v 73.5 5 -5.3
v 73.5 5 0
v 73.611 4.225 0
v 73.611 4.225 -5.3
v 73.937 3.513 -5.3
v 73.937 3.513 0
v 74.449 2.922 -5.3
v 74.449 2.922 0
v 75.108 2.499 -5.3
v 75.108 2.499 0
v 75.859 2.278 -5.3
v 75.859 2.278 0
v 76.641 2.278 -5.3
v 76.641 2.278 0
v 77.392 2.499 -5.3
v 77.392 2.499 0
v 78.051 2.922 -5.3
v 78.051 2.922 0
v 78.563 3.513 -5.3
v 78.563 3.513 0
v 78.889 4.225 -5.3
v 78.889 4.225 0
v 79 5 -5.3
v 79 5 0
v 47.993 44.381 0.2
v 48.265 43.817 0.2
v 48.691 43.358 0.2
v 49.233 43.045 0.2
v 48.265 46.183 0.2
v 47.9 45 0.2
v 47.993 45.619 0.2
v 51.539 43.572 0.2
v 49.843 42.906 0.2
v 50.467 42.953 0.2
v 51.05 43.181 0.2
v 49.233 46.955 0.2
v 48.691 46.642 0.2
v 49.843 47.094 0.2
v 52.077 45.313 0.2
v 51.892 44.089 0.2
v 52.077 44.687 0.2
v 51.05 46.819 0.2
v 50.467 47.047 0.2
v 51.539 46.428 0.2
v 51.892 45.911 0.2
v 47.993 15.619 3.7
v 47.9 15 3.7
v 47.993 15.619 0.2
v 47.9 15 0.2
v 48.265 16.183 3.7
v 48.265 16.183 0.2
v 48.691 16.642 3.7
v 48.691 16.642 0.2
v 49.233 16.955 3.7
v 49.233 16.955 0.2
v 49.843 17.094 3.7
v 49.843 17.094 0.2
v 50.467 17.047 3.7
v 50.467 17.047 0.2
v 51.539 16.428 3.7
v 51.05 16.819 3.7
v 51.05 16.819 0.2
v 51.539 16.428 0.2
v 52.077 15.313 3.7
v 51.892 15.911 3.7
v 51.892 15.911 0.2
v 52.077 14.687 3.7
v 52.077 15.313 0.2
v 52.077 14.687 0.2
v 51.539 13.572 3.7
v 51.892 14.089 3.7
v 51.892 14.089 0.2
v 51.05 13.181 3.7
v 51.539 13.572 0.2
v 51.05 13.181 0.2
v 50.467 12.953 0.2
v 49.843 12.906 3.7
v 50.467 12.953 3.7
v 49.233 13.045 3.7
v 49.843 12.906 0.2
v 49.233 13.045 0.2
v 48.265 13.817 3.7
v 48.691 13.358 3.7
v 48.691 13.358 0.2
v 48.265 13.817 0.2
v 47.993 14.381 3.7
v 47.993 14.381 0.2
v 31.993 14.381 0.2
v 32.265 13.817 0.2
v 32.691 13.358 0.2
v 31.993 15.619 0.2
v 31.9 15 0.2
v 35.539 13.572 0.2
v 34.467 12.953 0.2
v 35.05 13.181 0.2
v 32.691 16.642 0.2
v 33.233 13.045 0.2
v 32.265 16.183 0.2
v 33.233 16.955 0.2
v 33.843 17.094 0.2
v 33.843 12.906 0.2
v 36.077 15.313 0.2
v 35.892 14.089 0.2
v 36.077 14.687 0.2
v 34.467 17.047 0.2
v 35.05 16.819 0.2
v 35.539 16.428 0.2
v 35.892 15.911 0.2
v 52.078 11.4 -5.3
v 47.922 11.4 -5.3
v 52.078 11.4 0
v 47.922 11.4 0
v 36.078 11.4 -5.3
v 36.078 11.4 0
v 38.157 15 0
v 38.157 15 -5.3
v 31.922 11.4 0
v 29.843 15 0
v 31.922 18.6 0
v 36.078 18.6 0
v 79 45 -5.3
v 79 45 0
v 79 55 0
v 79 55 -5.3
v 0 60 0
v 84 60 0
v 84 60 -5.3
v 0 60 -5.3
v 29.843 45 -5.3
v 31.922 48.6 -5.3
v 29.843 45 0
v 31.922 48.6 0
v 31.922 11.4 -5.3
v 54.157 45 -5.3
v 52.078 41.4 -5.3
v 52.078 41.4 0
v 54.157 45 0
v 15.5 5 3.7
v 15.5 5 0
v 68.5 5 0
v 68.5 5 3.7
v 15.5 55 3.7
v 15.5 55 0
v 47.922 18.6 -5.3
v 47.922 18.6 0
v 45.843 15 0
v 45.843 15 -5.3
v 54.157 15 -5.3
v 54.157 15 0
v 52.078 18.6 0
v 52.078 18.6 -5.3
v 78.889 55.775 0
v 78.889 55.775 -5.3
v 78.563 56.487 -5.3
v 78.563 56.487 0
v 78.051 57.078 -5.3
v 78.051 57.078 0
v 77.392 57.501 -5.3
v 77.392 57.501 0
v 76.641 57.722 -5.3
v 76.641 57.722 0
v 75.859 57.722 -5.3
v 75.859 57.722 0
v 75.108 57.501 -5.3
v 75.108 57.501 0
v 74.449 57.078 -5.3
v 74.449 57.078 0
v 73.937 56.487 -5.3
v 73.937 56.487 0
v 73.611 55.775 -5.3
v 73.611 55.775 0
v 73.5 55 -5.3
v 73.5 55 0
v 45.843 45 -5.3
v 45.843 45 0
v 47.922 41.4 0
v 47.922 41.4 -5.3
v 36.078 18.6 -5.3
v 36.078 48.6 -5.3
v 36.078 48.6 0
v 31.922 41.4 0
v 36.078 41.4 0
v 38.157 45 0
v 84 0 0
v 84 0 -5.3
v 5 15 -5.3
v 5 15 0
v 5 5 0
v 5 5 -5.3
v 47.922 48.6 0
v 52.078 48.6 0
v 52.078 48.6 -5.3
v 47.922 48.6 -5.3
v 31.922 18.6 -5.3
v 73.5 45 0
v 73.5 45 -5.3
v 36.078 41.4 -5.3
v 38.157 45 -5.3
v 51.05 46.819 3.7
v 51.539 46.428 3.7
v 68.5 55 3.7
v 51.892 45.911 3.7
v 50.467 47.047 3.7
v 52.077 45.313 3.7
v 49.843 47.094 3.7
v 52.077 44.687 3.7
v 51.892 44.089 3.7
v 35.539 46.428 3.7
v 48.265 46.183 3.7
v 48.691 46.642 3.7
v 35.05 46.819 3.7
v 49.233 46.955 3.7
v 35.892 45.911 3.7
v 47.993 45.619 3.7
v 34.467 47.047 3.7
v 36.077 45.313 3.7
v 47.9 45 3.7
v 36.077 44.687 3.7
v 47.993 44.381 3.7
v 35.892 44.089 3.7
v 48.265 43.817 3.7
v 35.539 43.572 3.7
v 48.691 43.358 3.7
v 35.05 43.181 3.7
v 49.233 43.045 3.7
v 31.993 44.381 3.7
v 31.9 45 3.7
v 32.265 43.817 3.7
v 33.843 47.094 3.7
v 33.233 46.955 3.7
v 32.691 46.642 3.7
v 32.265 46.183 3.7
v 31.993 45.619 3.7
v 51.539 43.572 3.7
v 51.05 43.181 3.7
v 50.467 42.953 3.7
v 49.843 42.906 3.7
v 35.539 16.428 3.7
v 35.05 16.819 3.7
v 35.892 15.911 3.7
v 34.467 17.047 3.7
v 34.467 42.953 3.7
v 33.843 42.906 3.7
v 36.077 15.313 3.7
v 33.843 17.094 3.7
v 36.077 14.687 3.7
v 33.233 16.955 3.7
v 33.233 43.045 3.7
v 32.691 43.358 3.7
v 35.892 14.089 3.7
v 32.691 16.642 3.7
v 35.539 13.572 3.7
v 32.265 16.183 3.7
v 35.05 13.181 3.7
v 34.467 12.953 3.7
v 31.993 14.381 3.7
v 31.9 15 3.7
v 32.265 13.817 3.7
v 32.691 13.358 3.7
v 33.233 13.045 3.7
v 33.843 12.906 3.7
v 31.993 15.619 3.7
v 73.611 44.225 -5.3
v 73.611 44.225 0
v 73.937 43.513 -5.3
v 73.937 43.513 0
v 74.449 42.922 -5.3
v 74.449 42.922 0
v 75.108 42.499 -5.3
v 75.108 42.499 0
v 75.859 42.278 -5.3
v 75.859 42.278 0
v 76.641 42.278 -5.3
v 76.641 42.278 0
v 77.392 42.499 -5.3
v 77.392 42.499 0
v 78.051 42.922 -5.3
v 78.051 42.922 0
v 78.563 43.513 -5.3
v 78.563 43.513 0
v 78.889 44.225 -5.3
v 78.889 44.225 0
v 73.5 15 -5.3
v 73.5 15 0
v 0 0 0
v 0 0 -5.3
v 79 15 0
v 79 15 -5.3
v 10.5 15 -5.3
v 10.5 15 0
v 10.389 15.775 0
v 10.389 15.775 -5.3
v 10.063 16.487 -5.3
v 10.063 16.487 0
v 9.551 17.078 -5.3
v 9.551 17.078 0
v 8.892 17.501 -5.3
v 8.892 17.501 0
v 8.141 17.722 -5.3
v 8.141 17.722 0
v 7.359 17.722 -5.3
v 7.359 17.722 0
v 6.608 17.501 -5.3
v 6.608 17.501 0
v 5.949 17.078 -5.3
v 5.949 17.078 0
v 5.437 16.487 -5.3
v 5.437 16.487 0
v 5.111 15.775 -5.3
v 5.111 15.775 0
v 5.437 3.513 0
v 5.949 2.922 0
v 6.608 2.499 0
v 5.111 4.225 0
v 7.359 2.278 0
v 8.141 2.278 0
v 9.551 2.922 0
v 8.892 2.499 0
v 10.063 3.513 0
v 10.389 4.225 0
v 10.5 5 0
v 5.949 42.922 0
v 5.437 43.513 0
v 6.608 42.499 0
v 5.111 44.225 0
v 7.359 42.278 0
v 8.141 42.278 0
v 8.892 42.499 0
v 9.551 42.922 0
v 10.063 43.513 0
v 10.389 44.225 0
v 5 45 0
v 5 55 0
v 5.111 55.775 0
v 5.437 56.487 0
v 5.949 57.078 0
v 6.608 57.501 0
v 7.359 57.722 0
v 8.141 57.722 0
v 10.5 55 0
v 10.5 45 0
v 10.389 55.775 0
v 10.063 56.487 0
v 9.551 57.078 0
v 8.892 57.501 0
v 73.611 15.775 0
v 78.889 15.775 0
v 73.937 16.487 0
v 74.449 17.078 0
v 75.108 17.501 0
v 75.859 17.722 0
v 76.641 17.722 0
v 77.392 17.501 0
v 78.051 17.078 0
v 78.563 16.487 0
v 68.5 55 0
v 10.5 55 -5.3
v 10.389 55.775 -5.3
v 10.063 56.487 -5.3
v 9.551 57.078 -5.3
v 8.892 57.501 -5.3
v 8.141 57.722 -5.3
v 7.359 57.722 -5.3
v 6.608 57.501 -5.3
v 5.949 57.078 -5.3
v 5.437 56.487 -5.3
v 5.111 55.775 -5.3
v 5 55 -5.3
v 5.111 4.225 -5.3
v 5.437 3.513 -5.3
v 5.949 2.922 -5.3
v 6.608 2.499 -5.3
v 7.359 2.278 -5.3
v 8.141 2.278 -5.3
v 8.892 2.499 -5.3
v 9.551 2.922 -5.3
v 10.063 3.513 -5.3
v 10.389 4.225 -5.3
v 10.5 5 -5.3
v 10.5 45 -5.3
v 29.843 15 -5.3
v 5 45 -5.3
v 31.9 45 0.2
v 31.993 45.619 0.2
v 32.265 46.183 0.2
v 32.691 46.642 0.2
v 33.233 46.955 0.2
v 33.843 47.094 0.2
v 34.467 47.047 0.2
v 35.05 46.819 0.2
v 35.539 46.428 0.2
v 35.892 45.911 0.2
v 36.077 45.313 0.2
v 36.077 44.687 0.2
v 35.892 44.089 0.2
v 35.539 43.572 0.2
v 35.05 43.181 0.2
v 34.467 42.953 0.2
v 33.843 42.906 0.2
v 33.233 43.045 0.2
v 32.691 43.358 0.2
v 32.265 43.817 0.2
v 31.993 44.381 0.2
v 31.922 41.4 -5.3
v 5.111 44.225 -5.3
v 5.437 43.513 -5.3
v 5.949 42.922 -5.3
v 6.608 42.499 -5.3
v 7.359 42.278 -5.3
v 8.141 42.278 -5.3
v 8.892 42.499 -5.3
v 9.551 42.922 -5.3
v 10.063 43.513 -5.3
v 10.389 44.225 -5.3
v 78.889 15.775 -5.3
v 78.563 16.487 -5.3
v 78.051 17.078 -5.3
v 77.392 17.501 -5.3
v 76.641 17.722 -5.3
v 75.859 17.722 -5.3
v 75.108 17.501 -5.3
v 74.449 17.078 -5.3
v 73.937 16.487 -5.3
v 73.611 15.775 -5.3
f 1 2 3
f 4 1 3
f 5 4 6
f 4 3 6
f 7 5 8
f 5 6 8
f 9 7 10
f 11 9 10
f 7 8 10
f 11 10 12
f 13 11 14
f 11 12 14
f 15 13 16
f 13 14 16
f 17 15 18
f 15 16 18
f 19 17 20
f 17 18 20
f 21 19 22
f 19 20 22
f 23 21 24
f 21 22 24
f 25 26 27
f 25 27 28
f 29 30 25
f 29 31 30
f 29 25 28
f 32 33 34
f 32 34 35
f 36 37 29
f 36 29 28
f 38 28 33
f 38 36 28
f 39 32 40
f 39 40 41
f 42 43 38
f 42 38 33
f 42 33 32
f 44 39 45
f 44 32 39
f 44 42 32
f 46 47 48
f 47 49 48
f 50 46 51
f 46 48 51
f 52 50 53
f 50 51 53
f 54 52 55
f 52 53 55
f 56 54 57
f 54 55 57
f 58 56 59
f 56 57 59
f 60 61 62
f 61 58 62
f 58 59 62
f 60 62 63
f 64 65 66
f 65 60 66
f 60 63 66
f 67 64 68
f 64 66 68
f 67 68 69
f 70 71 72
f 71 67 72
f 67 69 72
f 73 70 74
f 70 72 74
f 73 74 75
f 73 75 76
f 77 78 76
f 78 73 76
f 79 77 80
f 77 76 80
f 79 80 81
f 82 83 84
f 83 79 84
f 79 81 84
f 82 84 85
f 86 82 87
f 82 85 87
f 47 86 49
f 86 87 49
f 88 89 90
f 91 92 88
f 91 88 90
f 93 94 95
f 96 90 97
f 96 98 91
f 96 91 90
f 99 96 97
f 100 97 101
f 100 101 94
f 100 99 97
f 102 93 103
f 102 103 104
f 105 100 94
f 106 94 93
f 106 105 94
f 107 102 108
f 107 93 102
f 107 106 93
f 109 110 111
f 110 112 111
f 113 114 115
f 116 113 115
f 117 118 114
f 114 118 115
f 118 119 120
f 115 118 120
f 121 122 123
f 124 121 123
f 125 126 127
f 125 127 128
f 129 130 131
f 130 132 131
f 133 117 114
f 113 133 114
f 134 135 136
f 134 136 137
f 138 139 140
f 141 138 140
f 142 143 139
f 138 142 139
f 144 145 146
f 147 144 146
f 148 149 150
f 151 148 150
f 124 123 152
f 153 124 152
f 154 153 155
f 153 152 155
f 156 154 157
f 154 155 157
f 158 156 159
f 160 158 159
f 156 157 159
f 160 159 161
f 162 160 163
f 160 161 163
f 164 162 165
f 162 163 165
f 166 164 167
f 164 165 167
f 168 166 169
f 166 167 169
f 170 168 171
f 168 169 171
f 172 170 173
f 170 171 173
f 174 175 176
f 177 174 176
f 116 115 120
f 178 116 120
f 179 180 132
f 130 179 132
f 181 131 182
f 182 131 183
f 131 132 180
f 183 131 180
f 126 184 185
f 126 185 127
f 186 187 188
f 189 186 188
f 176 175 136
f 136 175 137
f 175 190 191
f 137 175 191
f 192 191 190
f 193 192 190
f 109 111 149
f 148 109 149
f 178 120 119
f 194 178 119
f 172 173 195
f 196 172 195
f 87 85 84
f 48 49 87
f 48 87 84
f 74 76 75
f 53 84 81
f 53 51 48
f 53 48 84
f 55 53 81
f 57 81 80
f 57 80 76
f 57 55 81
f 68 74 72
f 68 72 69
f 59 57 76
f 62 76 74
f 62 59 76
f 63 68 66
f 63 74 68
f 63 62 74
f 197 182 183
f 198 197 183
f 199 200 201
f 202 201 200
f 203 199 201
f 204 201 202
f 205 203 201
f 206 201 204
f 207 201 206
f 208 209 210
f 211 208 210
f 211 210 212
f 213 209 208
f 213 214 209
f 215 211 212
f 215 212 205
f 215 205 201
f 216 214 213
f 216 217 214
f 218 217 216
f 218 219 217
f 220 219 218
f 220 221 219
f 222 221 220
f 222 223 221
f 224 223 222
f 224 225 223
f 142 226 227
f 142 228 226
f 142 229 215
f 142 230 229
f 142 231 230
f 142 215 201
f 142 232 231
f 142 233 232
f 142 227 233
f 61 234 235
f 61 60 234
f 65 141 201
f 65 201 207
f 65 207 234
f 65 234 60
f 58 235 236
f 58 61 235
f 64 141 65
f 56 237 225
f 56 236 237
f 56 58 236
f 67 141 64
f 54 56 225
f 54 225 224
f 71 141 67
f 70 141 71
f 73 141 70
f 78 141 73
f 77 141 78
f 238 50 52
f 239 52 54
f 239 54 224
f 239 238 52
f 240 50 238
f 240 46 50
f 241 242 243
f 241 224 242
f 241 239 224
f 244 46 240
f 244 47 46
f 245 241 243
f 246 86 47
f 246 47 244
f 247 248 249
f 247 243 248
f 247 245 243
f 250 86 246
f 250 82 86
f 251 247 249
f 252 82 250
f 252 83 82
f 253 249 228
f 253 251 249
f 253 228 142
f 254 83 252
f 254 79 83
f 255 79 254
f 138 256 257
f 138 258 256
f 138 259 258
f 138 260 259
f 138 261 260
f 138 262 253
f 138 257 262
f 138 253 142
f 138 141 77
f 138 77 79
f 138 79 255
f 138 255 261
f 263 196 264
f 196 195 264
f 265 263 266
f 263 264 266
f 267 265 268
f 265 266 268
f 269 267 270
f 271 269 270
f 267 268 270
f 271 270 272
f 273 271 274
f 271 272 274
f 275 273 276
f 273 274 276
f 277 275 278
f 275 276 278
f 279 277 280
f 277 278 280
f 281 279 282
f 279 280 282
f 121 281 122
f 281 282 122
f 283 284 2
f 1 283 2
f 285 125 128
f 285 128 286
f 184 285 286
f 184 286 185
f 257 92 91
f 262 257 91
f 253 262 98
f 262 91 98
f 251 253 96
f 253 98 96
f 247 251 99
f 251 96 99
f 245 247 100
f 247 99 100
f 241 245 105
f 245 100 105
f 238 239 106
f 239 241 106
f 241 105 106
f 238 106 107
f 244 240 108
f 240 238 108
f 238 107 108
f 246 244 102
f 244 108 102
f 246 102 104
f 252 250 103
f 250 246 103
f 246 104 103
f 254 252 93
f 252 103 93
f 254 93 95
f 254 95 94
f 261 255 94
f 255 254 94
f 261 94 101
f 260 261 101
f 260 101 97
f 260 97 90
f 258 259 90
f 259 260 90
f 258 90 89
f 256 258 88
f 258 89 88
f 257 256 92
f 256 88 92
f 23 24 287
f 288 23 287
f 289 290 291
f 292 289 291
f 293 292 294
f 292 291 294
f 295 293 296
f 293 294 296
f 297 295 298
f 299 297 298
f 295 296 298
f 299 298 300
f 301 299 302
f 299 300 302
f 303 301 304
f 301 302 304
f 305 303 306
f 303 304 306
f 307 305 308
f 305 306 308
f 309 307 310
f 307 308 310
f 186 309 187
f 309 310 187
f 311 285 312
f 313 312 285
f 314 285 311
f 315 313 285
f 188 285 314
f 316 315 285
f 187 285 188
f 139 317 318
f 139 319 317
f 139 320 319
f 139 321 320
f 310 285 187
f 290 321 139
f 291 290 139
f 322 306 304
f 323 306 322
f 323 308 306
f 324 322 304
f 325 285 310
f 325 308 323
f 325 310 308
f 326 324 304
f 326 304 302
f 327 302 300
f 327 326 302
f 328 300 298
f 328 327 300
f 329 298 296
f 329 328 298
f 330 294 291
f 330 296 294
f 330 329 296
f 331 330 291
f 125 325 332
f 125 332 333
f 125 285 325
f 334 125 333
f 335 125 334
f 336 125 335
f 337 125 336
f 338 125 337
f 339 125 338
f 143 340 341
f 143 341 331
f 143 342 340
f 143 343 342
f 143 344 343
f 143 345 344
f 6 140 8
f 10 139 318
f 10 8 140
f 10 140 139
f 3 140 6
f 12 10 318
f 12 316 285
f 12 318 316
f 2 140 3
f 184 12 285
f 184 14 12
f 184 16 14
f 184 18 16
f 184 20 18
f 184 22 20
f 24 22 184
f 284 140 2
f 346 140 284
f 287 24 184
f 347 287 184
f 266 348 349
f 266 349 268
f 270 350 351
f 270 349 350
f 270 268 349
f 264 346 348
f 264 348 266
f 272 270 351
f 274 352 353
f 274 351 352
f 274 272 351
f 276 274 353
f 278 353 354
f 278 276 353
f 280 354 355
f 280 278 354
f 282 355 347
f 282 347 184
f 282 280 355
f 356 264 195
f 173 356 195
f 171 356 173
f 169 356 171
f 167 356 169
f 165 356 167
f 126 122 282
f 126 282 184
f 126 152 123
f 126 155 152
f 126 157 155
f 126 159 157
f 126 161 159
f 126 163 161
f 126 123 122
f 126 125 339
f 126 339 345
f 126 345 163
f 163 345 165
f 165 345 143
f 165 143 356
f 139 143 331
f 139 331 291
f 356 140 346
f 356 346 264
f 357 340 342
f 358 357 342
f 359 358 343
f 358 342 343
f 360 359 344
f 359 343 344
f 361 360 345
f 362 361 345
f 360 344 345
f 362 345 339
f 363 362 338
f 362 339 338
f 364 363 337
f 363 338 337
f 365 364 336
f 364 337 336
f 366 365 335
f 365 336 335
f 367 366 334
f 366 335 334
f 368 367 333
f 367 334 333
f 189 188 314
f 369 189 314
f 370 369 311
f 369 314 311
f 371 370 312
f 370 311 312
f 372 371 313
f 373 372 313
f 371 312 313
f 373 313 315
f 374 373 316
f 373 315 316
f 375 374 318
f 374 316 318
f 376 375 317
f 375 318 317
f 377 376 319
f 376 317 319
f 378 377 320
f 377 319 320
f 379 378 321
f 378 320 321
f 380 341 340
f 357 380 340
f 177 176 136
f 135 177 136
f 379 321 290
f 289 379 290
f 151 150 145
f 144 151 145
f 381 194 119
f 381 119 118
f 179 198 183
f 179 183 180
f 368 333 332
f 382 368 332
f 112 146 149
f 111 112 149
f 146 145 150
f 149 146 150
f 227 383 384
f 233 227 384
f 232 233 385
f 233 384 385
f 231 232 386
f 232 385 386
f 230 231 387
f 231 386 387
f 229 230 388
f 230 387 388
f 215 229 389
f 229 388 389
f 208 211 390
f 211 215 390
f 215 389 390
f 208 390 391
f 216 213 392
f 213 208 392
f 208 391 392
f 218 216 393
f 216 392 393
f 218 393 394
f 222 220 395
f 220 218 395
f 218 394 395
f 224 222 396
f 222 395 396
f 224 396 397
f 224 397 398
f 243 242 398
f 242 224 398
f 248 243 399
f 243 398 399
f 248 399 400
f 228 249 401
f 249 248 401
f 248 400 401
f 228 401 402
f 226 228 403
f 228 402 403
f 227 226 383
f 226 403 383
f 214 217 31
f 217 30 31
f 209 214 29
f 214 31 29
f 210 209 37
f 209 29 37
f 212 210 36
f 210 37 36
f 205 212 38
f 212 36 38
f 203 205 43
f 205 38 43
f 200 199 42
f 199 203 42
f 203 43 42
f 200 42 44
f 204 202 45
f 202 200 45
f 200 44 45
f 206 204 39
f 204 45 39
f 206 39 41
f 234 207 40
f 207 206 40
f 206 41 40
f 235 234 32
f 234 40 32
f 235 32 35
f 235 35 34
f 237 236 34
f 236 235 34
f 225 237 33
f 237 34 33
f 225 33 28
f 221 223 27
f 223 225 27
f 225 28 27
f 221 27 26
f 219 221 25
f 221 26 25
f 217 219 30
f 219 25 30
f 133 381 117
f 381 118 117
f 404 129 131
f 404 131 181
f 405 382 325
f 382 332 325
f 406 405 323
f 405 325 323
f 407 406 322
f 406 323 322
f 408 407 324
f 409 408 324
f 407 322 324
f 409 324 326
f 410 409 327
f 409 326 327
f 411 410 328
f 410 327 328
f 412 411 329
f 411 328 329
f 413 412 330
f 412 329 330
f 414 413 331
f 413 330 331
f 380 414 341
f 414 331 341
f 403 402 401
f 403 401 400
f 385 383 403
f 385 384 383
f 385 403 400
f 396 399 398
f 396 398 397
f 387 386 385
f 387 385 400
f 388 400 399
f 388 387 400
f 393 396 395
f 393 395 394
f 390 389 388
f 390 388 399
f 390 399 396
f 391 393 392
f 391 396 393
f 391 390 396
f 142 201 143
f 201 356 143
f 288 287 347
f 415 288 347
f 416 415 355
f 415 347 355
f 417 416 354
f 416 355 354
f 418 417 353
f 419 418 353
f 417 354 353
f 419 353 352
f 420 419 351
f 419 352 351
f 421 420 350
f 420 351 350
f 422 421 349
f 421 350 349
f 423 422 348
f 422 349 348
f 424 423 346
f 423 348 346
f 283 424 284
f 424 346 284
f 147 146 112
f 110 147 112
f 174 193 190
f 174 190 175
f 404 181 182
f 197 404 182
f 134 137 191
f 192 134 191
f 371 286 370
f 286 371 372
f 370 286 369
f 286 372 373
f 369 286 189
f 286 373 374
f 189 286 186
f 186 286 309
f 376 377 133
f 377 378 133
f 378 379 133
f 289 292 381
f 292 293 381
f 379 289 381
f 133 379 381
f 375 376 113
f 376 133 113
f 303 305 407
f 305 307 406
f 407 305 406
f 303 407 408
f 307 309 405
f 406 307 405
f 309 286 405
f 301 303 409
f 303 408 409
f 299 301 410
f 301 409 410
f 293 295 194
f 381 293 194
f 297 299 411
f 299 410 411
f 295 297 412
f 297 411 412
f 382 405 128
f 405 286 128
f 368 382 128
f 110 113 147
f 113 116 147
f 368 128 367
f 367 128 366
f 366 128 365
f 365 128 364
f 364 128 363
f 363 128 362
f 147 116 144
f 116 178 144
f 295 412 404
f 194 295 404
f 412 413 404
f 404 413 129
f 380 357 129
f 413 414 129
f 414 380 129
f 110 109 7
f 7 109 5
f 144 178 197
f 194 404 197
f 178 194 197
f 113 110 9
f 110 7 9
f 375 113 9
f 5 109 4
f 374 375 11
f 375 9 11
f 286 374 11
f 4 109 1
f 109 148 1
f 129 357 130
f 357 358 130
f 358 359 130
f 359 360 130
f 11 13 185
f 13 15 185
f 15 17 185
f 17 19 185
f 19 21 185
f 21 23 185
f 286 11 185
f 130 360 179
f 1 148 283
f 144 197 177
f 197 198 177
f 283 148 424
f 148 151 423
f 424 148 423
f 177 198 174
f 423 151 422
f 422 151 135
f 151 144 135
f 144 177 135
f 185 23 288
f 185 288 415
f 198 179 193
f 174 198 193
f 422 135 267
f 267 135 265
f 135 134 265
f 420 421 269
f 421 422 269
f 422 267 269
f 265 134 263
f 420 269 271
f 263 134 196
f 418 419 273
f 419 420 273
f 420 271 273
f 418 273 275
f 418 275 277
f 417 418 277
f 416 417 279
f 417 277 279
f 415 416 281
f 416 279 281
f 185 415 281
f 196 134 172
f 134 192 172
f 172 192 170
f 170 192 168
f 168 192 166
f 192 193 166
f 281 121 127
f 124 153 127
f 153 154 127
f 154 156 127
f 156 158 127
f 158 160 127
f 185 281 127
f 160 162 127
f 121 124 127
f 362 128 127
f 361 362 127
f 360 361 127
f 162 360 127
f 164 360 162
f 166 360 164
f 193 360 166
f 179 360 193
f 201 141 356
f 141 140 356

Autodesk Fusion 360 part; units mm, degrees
sketch "Sketch1" plane through (0, 0, 0) normal (0, 0, 1) x (1, 0, 0)
  line L0 (0, 0) -> (84, 0)
  line L1 (84, 0) -> (84, 60)
  line L2 (84, 60) -> (0, 60)
  line L3 (0, 60) -> (0, 0)
  line L4 (5, 60) -> (5, 0) construction
  line L5 (79, 60) -> (79, 0) construction
  line L6 (5, 50) -> (79, 50) construction
  line L7 (5, 10) -> (79, 10) construction
  line L8 (7.75, 50) -> (7.75, 10) construction
  line L9 (76.25, 50) -> (76.25, 10) construction
  line L10 (5, 55) -> (79, 55) construction
  line L11 (5, 5) -> (79, 5) construction
  line L12 (7.75, 10) -> (7.75, 5) construction
  line L13 (7.75, 50) -> (7.75, 55) construction
  line L14 (76.25, 50) -> (76.25, 55) construction
  line L15 (76.25, 10) -> (76.25, 5) construction
  line L16 (7.75, 15) -> (76.25, 15) construction
  line L17 (7.75, 45) -> (76.25, 45) construction
  line L18 (5, 55) -> (5, 45)
  arc A0 (5, 45) -> (10.5, 45) centre (7.75, 45) ccw
  line L19 (10.5, 45) -> (10.5, 55)
  arc A1 (10.5, 55) -> (5, 55) centre (7.75, 55) ccw
  line L20 (7.75, 55) -> (7.75, 45) construction
  line L21 (10.5, 5) -> (10.5, 15)
  arc A2 (10.5, 15) -> (5, 15) centre (7.75, 15) ccw
  line L22 (5, 15) -> (5, 5)
  arc A3 (5, 5) -> (10.5, 5) centre (7.75, 5) ccw
  line L23 (7.75, 5) -> (7.75, 15) construction
  line L24 (73.5, 55) -> (73.5, 45)
  arc A4 (73.5, 45) -> (79, 45) centre (76.25, 45) ccw
  line L25 (79, 45) -> (79, 55)
  arc A5 (79, 55) -> (73.5, 55) centre (76.25, 55) ccw
  line L26 (76.25, 55) -> (76.25, 45) construction
  line L27 (73.5, 15) -> (73.5, 5)
  arc A6 (73.5, 5) -> (79, 5) centre (76.25, 5) ccw
  line L28 (79, 5) -> (79, 15)
  arc A7 (79, 15) -> (73.5, 15) centre (76.25, 15) ccw
  line L29 (76.25, 15) -> (76.25, 5) construction
  line L30 (15.5, 55) -> (68.5, 55)
  line L31 (68.5, 55) -> (68.5, 5)
  line L32 (68.5, 5) -> (15.5, 5)
  line L33 (15.5, 5) -> (15.5, 55)
  line L34 (15.5, 55) -> (68.5, 5) construction
  line L35 (68.5, 55) -> (15.5, 5) construction
  line L36 (68.5, 55) -> (68.5, 5) construction
  line L37 (15.5, 55) -> (15.5, 5) construction
  line L38 (50, 15) -> (50, 45) construction
  line L39 (34, 15) -> (34, 45) construction
  line L40 (31.9215, 18.6) -> (29.8431, 15)
  line L41 (29.8431, 15) -> (31.9215, 11.4)
  line L42 (31.9215, 11.4) -> (36.0785, 11.4)
  line L43 (36.0785, 11.4) -> (38.1569, 15)
  line L44 (38.1569, 15) -> (36.0785, 18.6)
  line L45 (36.0785, 18.6) -> (31.9215, 18.6)
  line L46 (36.0785, 41.4) -> (38.1569, 45)
  line L47 (38.1569, 45) -> (36.0785, 48.6)
  line L48 (36.0785, 48.6) -> (31.9215, 48.6)
  line L49 (31.9215, 48.6) -> (29.8431, 45)
  line L50 (29.8431, 45) -> (31.9215, 41.4)
  line L51 (31.9215, 41.4) -> (36.0785, 41.4)
  line L52 (52.0785, 41.4) -> (54.1569, 45)
  line L53 (54.1569, 45) -> (52.0785, 48.6)
  line L54 (52.0785, 48.6) -> (47.9215, 48.6)
  line L55 (47.9215, 48.6) -> (45.8431, 45)
  line L56 (45.8431, 45) -> (47.9215, 41.4)
  line L57 (47.9215, 41.4) -> (52.0785, 41.4)
  line L58 (47.9215, 18.6) -> (45.8431, 15)
  line L59 (45.8431, 15) -> (47.9215, 11.4)
  line L60 (47.9215, 11.4) -> (52.0785, 11.4)
  line L61 (52.0785, 11.4) -> (54.1569, 15)
  line L62 (54.1569, 15) -> (52.0785, 18.6)
  line L63 (52.0785, 18.6) -> (47.9215, 18.6)
  point P0 (42, 30)
  point P1 (34, 15)
  point P2 (34, 45)
  point P3 (50, 45)
  point P4 (50, 15)
  dimension "d1" = 84
  dimension "d2" = 60
  dimension "d3" = 5
  dimension "d4" = 5
  dimension "d5" = 2.75
  dimension "d6" = 2.75
  dimension "d7" = 40
  dimension "d8" = 5
  dimension "d9" = 5
  dimension "d10" = 5
  dimension "d11" = 5
  dimension "d12" = 5.5
  dimension "d13" = 5.5
  dimension "d16" = 53
  dimension "d17" = 50
  dimension "d18" = 18.5
  dimension "d19" = 18.5
  dimension "d20" = 3.6
  dimension "d21" = 3.6
  dimension "d22" = 3.6
  dimension "d23" = 3.6
extrude "Extrude1" add sketch "Sketch1" against normal blind 5.3 contours L0 L1 L2 L3 | L30 L31 L32 L33
extrude "Extrude2" add sketch "Sketch1" along normal blind 0.2 contours L30 L31 L32 L33 | L40 L41 L42 L43 L44 L45 | L46 L47 L48 L49 L50 L51 | L52 L53 L54 L55 L56 L57 | L58 L59 L60 L61 L62 L63
sketch "Sketch2" plane through (0, 0, 0.2) normal (0, 0, 1) x (-1, 0, 0)
  line L0 (-15.5, -5) -> (-68.5, -5)
  line L1 (-68.5, -5) -> (-68.5, -55)
  line L2 (-68.5, -55) -> (-15.5, -55)
  line L3 (-15.5, -55) -> (-15.5, -5)
  circle A0 centre (-34, -45) radius 2.1
  circle A1 centre (-50, -45) radius 2.1
  circle A2 centre (-34, -15) radius 2.1
  circle A3 centre (-50, -15) radius 2.1
  point P0 (-50, -45)
  point P1 (-34, -45)
  point P2 (-34, -15)
  point P3 (-50, -15)
  dimension "d26" = 4.2
  dimension "d27" = 4.2
  dimension "d28" = 4.2
  dimension "d29" = 4.2
extrude "Extrude3" add sketch "Sketch2" along normal blind 3.5
